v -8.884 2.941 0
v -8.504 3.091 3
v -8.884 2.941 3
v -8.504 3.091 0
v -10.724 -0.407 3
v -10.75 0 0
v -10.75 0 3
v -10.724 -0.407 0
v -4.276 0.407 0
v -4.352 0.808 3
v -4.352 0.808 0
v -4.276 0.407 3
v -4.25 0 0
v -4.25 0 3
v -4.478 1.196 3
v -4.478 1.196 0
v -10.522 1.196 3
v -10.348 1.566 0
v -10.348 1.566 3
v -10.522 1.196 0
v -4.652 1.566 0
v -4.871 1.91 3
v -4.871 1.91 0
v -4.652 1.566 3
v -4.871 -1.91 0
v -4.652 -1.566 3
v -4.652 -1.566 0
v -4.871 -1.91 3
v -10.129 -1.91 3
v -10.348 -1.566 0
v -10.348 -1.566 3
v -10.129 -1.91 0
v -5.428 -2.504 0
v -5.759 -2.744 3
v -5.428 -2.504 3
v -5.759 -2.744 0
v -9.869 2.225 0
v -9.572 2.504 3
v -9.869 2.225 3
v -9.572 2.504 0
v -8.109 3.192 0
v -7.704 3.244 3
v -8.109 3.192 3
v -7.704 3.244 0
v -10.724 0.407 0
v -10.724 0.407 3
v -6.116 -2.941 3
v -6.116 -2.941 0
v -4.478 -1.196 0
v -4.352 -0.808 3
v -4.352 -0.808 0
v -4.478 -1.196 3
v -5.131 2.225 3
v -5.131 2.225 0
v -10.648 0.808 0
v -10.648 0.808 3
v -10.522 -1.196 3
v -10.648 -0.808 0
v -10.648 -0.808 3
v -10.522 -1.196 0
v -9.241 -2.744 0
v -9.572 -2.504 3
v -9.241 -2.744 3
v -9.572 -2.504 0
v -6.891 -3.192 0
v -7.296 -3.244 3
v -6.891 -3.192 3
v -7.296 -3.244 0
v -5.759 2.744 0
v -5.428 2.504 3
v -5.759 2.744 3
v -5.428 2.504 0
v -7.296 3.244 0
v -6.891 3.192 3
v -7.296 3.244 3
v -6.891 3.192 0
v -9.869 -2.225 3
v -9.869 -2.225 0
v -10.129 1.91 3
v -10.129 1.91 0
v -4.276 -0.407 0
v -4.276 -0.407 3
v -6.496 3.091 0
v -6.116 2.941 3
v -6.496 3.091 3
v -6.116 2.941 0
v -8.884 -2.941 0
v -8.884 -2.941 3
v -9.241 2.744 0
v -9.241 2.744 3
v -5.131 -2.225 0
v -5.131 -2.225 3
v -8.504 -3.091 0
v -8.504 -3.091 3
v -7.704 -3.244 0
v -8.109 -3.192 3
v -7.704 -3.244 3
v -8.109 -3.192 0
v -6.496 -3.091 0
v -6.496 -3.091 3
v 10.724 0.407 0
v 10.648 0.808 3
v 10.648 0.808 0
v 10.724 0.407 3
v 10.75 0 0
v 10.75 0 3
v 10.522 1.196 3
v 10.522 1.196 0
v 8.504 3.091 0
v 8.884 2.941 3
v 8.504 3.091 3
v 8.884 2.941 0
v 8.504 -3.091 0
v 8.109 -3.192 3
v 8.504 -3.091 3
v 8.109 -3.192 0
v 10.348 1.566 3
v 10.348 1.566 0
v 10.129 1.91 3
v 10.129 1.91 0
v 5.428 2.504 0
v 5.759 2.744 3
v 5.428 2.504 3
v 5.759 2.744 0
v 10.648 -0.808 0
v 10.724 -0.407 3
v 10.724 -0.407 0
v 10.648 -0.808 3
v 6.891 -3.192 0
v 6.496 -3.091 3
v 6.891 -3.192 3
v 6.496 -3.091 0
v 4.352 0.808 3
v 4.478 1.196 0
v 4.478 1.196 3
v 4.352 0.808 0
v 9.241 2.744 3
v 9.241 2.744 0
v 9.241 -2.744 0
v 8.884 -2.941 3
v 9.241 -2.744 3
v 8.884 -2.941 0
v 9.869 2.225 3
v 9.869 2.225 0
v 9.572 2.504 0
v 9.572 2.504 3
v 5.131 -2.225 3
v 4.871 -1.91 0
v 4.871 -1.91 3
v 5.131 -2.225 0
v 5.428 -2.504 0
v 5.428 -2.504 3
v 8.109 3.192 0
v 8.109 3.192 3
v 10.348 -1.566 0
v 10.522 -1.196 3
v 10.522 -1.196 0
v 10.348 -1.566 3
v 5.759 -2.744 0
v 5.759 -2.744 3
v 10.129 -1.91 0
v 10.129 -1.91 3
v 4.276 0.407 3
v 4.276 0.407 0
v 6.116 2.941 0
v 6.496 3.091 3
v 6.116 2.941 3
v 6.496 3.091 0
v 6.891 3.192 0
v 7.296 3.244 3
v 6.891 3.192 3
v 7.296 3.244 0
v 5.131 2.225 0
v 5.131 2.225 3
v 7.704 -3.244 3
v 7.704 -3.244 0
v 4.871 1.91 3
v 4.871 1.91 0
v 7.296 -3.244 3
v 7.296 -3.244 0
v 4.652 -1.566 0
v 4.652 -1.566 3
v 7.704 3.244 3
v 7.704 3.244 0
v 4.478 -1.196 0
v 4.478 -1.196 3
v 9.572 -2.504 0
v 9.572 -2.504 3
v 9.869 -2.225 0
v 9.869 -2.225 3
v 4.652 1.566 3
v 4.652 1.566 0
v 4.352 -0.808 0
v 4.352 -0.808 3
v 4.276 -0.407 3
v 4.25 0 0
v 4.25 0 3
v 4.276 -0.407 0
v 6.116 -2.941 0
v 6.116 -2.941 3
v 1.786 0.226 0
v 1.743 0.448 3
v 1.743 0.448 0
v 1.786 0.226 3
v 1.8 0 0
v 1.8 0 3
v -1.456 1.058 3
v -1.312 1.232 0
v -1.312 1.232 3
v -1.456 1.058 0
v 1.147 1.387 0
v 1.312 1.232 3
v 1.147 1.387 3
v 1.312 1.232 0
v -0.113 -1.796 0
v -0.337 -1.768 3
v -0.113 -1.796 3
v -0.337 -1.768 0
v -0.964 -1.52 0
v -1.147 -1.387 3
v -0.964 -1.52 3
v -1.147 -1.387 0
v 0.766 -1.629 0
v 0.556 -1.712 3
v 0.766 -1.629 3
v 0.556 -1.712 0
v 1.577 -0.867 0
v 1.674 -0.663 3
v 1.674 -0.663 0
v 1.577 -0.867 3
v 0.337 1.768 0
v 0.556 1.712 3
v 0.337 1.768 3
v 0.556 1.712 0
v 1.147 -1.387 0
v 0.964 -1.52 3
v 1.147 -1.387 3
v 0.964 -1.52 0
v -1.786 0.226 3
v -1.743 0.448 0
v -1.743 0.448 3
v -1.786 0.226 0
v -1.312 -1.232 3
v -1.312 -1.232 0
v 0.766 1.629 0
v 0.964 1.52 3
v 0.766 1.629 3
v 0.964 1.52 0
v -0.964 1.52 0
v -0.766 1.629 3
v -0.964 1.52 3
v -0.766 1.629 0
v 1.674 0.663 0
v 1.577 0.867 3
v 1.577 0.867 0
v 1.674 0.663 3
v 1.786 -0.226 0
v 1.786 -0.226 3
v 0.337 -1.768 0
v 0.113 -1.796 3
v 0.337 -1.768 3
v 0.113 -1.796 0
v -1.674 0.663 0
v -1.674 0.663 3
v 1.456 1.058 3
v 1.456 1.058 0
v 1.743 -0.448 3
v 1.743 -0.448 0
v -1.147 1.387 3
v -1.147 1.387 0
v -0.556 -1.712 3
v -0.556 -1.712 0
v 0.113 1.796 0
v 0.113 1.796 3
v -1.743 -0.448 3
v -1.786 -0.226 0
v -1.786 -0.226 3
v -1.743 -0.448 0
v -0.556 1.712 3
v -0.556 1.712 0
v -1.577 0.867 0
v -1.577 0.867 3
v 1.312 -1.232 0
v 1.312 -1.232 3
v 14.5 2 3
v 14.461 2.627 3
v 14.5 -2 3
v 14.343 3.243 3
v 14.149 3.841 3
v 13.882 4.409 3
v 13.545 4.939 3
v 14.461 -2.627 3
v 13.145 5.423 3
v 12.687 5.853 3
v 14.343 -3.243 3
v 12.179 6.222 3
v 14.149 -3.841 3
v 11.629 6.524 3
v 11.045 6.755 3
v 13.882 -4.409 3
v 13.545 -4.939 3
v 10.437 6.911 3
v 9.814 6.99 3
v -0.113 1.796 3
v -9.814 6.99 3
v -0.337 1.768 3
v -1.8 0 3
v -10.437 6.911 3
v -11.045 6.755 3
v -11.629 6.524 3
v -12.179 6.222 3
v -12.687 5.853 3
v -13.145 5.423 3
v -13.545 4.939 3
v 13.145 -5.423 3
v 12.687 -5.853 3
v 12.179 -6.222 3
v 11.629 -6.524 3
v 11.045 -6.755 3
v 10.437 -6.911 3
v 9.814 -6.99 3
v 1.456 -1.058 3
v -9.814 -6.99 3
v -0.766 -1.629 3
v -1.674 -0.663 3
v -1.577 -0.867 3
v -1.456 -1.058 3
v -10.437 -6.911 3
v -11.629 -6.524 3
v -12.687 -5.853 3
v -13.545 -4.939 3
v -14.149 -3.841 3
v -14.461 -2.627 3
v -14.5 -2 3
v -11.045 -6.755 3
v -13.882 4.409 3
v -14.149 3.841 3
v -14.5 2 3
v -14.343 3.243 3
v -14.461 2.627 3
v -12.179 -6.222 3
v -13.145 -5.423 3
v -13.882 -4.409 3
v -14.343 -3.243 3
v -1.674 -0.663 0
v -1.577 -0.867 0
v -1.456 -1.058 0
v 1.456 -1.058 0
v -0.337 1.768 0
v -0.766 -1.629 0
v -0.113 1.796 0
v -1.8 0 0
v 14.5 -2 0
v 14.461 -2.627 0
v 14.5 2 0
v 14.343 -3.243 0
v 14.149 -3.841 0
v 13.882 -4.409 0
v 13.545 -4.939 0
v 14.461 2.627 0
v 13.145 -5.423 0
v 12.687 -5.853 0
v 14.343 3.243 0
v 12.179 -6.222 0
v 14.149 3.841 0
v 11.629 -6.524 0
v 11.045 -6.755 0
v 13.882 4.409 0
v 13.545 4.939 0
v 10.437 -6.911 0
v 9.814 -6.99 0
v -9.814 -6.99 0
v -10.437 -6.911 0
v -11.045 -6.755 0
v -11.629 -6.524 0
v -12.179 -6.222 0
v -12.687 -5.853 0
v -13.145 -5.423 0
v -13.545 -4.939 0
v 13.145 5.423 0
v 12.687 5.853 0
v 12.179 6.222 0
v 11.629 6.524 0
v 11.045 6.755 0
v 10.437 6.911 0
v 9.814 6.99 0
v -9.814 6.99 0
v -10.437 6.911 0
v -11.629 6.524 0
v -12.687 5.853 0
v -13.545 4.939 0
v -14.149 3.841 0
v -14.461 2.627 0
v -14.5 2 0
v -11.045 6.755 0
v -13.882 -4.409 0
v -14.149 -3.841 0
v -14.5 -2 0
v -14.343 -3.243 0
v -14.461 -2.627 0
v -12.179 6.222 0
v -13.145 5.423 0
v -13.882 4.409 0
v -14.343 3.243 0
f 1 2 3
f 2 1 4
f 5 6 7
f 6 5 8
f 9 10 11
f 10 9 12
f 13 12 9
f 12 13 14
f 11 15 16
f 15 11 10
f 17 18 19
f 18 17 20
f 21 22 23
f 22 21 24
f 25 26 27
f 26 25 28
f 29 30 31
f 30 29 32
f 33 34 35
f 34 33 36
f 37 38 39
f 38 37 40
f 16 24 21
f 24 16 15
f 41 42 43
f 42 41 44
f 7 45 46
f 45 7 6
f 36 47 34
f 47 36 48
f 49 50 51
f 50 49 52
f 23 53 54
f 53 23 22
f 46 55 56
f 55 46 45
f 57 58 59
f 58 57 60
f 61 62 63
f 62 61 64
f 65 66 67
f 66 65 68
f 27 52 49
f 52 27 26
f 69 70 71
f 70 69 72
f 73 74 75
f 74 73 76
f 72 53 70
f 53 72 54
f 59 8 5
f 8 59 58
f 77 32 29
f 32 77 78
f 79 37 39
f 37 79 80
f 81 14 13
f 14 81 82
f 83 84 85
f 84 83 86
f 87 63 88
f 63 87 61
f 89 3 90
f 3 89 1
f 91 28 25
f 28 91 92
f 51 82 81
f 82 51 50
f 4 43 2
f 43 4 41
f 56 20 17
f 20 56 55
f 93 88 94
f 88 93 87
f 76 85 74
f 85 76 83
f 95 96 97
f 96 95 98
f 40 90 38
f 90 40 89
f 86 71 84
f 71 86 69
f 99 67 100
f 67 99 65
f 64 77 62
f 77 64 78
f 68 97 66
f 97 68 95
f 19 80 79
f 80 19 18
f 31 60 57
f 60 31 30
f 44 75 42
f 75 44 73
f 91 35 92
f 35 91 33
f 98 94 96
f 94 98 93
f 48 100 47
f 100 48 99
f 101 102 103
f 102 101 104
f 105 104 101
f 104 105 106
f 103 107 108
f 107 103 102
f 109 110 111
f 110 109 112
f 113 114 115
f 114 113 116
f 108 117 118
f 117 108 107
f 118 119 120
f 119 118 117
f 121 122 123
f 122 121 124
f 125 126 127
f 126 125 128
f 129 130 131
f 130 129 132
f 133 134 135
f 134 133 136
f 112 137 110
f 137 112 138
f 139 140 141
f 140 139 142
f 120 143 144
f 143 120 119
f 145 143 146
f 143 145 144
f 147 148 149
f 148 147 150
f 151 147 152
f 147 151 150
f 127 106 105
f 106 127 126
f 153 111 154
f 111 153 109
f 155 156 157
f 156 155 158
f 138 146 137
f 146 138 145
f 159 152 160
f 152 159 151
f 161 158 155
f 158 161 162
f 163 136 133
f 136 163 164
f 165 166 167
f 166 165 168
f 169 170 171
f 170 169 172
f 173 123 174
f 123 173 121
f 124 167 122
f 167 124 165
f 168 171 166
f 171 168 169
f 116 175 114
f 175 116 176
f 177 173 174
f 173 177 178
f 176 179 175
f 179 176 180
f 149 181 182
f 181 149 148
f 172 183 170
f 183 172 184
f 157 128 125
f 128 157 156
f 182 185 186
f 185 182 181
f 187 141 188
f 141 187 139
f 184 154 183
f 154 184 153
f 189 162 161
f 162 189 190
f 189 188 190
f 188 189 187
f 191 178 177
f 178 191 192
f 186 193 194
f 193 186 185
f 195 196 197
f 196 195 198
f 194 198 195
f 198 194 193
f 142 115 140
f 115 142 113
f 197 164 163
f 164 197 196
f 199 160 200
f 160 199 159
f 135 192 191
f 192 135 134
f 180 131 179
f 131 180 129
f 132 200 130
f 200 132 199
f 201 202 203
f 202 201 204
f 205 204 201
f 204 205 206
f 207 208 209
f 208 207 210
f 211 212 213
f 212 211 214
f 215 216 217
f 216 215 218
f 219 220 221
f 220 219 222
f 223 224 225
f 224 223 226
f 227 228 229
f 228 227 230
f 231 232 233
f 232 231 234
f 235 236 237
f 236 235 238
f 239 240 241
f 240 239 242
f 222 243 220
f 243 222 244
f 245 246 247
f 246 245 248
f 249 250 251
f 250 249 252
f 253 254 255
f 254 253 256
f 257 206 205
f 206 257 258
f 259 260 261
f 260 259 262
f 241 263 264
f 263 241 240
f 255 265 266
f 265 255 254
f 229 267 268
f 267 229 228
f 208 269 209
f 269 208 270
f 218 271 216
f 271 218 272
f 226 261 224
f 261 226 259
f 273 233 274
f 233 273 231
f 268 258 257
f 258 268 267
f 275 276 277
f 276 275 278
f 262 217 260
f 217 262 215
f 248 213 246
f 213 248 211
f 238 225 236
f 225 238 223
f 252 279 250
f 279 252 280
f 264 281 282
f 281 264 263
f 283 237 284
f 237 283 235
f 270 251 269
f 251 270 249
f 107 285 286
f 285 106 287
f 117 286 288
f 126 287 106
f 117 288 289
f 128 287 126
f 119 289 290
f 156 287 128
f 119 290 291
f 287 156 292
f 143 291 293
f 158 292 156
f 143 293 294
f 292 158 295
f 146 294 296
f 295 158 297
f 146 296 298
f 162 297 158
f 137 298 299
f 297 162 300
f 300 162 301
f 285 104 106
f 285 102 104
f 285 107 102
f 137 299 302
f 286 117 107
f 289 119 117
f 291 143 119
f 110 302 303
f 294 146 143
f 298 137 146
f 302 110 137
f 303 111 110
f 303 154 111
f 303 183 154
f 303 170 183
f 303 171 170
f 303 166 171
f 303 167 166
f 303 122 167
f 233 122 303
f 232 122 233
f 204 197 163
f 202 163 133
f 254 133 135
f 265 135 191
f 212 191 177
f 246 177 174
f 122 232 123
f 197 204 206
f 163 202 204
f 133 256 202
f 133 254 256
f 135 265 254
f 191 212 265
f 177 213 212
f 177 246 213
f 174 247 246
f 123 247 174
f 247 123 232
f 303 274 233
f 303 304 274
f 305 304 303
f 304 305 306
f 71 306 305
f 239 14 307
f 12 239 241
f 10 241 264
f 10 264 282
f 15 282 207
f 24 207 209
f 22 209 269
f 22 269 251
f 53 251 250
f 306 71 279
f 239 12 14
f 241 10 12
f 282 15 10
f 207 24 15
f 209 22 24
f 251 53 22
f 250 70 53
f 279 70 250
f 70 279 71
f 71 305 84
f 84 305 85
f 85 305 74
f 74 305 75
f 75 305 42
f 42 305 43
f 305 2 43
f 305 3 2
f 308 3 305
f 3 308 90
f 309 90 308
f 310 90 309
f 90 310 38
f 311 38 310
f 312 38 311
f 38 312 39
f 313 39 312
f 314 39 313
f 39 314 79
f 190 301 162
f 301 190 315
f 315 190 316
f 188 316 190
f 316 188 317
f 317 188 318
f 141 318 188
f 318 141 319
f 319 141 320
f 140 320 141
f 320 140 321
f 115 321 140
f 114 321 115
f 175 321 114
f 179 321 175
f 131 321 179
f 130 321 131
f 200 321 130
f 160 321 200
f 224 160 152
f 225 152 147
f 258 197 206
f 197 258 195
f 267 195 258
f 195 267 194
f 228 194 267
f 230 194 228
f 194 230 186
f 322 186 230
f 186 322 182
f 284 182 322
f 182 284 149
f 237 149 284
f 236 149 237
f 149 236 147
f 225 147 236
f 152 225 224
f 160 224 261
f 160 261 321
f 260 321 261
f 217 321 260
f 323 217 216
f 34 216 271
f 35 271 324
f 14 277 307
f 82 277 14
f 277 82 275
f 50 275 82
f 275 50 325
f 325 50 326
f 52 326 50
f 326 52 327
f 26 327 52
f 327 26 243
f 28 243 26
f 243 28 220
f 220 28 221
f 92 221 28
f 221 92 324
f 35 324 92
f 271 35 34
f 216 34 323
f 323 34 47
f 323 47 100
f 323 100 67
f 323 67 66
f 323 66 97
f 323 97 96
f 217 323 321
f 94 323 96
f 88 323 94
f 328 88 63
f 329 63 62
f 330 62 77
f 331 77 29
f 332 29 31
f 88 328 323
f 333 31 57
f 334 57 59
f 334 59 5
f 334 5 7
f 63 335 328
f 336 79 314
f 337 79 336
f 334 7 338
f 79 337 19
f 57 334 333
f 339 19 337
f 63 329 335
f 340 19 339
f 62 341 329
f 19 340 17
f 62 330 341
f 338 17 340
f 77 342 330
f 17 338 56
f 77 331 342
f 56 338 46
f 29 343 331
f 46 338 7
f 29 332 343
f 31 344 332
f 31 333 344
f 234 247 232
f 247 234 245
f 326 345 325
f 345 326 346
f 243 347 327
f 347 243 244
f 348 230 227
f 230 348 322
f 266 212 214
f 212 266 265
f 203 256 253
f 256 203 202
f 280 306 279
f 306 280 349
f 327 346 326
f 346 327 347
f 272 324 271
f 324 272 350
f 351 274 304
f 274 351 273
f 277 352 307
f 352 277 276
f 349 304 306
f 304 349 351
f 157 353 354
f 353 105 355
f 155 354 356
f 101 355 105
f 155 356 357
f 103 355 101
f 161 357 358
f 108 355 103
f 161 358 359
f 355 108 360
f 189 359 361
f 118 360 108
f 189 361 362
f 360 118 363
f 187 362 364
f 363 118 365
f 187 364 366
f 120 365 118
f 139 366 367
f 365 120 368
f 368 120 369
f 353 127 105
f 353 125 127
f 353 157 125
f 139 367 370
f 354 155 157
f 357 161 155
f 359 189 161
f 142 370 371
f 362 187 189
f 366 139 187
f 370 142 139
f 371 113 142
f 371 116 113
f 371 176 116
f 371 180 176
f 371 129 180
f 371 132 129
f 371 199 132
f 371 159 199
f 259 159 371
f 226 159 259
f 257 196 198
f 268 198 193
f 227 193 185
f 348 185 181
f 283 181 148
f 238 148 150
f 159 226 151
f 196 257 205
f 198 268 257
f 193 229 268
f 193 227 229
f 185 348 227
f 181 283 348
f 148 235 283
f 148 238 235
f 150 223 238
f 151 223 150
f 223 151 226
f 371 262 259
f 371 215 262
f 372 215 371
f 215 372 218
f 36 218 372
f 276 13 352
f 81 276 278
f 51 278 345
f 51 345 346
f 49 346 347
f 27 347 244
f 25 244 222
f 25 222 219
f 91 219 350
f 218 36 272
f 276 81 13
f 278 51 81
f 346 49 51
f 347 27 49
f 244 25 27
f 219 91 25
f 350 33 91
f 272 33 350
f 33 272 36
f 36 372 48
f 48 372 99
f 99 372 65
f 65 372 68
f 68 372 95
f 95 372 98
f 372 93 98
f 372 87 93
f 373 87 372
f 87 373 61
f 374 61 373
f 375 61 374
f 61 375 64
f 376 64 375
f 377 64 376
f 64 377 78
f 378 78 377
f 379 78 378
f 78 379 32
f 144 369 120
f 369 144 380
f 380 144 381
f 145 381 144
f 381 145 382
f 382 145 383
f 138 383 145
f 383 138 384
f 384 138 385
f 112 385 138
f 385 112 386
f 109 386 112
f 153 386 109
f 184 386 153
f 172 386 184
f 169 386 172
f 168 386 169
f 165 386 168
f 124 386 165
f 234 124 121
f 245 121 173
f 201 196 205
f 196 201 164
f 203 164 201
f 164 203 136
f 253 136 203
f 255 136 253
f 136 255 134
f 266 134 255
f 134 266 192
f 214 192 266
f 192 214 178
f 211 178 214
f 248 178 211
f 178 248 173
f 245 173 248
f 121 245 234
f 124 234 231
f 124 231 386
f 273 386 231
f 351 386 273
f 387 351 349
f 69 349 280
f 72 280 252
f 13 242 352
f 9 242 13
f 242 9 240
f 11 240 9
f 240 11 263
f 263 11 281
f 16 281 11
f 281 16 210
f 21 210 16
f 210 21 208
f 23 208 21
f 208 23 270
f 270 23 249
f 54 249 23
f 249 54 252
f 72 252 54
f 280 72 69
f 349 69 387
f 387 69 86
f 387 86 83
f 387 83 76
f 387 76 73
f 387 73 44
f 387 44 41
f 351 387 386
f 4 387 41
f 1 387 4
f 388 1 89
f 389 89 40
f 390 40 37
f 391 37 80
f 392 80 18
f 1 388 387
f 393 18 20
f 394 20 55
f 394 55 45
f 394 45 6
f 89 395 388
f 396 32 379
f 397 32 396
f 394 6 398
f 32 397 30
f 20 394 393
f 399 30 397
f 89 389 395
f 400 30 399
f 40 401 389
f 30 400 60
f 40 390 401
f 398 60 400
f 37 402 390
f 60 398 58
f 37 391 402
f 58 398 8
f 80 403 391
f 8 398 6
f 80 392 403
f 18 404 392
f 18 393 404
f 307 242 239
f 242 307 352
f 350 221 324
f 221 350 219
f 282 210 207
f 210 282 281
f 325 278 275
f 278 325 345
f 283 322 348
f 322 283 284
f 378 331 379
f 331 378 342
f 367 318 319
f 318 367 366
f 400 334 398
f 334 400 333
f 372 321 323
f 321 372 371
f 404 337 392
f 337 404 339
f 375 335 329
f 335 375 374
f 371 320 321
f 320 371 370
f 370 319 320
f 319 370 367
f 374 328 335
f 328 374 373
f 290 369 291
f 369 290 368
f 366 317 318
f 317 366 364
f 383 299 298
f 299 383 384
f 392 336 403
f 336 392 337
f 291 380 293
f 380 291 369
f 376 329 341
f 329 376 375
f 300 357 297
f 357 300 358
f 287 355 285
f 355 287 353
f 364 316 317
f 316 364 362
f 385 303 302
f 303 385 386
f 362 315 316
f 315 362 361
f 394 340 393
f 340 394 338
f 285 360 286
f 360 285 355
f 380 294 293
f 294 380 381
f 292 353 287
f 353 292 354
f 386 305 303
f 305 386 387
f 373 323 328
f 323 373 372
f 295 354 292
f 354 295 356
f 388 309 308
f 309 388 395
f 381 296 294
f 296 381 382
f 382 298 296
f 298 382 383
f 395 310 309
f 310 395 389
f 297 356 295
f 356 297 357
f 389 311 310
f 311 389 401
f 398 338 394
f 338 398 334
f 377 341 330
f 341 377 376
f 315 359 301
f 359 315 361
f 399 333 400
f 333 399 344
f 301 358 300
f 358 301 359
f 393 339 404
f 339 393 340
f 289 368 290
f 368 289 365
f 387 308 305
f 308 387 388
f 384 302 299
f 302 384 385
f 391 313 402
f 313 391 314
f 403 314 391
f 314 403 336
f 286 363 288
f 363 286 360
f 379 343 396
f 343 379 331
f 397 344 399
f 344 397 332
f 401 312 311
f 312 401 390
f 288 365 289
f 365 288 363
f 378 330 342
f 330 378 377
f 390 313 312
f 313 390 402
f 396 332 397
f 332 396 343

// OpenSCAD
$fn = 50;


difference() {
	union() {
		hull() {
			translate(v = [-9.5000000000, 2.0000000000, 0]) {
				cylinder(h = 3, r = 5);
			}
			translate(v = [9.5000000000, 2.0000000000, 0]) {
				cylinder(h = 3, r = 5);
			}
			translate(v = [-9.5000000000, -2.0000000000, 0]) {
				cylinder(h = 3, r = 5);
			}
			translate(v = [9.5000000000, -2.0000000000, 0]) {
				cylinder(h = 3, r = 5);
			}
		}
	}
	union() {
		translate(v = [-7.5000000000, 0.0000000000, -100.0000000000]) {
			cylinder(h = 200, r = 3.2500000000);
		}
		translate(v = [7.5000000000, 0.0000000000, -100.0000000000]) {
			cylinder(h = 200, r = 3.2500000000);
		}
		translate(v = [-7.5000000000, 0.0000000000, 0]) {
			cylinder(h = 3, r = 1.8000000000);
		}
		cylinder(h = 3, r = 1.8000000000);
		translate(v = [7.5000000000, 0.0000000000, 0]) {
			cylinder(h = 3, r = 1.8000000000);
		}
		translate(v = [-7.5000000000, 0.0000000000, 0]) {
			cylinder(h = 3, r = 1.8000000000);
		}
		cylinder(h = 3, r = 1.8000000000);
		translate(v = [7.5000000000, 0.0000000000, 0]) {
			cylinder(h = 3, r = 1.8000000000);
		}
		translate(v = [-7.5000000000, 0.0000000000, 0]) {
			cylinder(h = 3, r = 1.8000000000);
		}
		cylinder(h = 3, r = 1.8000000000);
		translate(v = [7.5000000000, 0.0000000000, 0]) {
			cylinder(h = 3, r = 1.8000000000);
		}
	}
}
